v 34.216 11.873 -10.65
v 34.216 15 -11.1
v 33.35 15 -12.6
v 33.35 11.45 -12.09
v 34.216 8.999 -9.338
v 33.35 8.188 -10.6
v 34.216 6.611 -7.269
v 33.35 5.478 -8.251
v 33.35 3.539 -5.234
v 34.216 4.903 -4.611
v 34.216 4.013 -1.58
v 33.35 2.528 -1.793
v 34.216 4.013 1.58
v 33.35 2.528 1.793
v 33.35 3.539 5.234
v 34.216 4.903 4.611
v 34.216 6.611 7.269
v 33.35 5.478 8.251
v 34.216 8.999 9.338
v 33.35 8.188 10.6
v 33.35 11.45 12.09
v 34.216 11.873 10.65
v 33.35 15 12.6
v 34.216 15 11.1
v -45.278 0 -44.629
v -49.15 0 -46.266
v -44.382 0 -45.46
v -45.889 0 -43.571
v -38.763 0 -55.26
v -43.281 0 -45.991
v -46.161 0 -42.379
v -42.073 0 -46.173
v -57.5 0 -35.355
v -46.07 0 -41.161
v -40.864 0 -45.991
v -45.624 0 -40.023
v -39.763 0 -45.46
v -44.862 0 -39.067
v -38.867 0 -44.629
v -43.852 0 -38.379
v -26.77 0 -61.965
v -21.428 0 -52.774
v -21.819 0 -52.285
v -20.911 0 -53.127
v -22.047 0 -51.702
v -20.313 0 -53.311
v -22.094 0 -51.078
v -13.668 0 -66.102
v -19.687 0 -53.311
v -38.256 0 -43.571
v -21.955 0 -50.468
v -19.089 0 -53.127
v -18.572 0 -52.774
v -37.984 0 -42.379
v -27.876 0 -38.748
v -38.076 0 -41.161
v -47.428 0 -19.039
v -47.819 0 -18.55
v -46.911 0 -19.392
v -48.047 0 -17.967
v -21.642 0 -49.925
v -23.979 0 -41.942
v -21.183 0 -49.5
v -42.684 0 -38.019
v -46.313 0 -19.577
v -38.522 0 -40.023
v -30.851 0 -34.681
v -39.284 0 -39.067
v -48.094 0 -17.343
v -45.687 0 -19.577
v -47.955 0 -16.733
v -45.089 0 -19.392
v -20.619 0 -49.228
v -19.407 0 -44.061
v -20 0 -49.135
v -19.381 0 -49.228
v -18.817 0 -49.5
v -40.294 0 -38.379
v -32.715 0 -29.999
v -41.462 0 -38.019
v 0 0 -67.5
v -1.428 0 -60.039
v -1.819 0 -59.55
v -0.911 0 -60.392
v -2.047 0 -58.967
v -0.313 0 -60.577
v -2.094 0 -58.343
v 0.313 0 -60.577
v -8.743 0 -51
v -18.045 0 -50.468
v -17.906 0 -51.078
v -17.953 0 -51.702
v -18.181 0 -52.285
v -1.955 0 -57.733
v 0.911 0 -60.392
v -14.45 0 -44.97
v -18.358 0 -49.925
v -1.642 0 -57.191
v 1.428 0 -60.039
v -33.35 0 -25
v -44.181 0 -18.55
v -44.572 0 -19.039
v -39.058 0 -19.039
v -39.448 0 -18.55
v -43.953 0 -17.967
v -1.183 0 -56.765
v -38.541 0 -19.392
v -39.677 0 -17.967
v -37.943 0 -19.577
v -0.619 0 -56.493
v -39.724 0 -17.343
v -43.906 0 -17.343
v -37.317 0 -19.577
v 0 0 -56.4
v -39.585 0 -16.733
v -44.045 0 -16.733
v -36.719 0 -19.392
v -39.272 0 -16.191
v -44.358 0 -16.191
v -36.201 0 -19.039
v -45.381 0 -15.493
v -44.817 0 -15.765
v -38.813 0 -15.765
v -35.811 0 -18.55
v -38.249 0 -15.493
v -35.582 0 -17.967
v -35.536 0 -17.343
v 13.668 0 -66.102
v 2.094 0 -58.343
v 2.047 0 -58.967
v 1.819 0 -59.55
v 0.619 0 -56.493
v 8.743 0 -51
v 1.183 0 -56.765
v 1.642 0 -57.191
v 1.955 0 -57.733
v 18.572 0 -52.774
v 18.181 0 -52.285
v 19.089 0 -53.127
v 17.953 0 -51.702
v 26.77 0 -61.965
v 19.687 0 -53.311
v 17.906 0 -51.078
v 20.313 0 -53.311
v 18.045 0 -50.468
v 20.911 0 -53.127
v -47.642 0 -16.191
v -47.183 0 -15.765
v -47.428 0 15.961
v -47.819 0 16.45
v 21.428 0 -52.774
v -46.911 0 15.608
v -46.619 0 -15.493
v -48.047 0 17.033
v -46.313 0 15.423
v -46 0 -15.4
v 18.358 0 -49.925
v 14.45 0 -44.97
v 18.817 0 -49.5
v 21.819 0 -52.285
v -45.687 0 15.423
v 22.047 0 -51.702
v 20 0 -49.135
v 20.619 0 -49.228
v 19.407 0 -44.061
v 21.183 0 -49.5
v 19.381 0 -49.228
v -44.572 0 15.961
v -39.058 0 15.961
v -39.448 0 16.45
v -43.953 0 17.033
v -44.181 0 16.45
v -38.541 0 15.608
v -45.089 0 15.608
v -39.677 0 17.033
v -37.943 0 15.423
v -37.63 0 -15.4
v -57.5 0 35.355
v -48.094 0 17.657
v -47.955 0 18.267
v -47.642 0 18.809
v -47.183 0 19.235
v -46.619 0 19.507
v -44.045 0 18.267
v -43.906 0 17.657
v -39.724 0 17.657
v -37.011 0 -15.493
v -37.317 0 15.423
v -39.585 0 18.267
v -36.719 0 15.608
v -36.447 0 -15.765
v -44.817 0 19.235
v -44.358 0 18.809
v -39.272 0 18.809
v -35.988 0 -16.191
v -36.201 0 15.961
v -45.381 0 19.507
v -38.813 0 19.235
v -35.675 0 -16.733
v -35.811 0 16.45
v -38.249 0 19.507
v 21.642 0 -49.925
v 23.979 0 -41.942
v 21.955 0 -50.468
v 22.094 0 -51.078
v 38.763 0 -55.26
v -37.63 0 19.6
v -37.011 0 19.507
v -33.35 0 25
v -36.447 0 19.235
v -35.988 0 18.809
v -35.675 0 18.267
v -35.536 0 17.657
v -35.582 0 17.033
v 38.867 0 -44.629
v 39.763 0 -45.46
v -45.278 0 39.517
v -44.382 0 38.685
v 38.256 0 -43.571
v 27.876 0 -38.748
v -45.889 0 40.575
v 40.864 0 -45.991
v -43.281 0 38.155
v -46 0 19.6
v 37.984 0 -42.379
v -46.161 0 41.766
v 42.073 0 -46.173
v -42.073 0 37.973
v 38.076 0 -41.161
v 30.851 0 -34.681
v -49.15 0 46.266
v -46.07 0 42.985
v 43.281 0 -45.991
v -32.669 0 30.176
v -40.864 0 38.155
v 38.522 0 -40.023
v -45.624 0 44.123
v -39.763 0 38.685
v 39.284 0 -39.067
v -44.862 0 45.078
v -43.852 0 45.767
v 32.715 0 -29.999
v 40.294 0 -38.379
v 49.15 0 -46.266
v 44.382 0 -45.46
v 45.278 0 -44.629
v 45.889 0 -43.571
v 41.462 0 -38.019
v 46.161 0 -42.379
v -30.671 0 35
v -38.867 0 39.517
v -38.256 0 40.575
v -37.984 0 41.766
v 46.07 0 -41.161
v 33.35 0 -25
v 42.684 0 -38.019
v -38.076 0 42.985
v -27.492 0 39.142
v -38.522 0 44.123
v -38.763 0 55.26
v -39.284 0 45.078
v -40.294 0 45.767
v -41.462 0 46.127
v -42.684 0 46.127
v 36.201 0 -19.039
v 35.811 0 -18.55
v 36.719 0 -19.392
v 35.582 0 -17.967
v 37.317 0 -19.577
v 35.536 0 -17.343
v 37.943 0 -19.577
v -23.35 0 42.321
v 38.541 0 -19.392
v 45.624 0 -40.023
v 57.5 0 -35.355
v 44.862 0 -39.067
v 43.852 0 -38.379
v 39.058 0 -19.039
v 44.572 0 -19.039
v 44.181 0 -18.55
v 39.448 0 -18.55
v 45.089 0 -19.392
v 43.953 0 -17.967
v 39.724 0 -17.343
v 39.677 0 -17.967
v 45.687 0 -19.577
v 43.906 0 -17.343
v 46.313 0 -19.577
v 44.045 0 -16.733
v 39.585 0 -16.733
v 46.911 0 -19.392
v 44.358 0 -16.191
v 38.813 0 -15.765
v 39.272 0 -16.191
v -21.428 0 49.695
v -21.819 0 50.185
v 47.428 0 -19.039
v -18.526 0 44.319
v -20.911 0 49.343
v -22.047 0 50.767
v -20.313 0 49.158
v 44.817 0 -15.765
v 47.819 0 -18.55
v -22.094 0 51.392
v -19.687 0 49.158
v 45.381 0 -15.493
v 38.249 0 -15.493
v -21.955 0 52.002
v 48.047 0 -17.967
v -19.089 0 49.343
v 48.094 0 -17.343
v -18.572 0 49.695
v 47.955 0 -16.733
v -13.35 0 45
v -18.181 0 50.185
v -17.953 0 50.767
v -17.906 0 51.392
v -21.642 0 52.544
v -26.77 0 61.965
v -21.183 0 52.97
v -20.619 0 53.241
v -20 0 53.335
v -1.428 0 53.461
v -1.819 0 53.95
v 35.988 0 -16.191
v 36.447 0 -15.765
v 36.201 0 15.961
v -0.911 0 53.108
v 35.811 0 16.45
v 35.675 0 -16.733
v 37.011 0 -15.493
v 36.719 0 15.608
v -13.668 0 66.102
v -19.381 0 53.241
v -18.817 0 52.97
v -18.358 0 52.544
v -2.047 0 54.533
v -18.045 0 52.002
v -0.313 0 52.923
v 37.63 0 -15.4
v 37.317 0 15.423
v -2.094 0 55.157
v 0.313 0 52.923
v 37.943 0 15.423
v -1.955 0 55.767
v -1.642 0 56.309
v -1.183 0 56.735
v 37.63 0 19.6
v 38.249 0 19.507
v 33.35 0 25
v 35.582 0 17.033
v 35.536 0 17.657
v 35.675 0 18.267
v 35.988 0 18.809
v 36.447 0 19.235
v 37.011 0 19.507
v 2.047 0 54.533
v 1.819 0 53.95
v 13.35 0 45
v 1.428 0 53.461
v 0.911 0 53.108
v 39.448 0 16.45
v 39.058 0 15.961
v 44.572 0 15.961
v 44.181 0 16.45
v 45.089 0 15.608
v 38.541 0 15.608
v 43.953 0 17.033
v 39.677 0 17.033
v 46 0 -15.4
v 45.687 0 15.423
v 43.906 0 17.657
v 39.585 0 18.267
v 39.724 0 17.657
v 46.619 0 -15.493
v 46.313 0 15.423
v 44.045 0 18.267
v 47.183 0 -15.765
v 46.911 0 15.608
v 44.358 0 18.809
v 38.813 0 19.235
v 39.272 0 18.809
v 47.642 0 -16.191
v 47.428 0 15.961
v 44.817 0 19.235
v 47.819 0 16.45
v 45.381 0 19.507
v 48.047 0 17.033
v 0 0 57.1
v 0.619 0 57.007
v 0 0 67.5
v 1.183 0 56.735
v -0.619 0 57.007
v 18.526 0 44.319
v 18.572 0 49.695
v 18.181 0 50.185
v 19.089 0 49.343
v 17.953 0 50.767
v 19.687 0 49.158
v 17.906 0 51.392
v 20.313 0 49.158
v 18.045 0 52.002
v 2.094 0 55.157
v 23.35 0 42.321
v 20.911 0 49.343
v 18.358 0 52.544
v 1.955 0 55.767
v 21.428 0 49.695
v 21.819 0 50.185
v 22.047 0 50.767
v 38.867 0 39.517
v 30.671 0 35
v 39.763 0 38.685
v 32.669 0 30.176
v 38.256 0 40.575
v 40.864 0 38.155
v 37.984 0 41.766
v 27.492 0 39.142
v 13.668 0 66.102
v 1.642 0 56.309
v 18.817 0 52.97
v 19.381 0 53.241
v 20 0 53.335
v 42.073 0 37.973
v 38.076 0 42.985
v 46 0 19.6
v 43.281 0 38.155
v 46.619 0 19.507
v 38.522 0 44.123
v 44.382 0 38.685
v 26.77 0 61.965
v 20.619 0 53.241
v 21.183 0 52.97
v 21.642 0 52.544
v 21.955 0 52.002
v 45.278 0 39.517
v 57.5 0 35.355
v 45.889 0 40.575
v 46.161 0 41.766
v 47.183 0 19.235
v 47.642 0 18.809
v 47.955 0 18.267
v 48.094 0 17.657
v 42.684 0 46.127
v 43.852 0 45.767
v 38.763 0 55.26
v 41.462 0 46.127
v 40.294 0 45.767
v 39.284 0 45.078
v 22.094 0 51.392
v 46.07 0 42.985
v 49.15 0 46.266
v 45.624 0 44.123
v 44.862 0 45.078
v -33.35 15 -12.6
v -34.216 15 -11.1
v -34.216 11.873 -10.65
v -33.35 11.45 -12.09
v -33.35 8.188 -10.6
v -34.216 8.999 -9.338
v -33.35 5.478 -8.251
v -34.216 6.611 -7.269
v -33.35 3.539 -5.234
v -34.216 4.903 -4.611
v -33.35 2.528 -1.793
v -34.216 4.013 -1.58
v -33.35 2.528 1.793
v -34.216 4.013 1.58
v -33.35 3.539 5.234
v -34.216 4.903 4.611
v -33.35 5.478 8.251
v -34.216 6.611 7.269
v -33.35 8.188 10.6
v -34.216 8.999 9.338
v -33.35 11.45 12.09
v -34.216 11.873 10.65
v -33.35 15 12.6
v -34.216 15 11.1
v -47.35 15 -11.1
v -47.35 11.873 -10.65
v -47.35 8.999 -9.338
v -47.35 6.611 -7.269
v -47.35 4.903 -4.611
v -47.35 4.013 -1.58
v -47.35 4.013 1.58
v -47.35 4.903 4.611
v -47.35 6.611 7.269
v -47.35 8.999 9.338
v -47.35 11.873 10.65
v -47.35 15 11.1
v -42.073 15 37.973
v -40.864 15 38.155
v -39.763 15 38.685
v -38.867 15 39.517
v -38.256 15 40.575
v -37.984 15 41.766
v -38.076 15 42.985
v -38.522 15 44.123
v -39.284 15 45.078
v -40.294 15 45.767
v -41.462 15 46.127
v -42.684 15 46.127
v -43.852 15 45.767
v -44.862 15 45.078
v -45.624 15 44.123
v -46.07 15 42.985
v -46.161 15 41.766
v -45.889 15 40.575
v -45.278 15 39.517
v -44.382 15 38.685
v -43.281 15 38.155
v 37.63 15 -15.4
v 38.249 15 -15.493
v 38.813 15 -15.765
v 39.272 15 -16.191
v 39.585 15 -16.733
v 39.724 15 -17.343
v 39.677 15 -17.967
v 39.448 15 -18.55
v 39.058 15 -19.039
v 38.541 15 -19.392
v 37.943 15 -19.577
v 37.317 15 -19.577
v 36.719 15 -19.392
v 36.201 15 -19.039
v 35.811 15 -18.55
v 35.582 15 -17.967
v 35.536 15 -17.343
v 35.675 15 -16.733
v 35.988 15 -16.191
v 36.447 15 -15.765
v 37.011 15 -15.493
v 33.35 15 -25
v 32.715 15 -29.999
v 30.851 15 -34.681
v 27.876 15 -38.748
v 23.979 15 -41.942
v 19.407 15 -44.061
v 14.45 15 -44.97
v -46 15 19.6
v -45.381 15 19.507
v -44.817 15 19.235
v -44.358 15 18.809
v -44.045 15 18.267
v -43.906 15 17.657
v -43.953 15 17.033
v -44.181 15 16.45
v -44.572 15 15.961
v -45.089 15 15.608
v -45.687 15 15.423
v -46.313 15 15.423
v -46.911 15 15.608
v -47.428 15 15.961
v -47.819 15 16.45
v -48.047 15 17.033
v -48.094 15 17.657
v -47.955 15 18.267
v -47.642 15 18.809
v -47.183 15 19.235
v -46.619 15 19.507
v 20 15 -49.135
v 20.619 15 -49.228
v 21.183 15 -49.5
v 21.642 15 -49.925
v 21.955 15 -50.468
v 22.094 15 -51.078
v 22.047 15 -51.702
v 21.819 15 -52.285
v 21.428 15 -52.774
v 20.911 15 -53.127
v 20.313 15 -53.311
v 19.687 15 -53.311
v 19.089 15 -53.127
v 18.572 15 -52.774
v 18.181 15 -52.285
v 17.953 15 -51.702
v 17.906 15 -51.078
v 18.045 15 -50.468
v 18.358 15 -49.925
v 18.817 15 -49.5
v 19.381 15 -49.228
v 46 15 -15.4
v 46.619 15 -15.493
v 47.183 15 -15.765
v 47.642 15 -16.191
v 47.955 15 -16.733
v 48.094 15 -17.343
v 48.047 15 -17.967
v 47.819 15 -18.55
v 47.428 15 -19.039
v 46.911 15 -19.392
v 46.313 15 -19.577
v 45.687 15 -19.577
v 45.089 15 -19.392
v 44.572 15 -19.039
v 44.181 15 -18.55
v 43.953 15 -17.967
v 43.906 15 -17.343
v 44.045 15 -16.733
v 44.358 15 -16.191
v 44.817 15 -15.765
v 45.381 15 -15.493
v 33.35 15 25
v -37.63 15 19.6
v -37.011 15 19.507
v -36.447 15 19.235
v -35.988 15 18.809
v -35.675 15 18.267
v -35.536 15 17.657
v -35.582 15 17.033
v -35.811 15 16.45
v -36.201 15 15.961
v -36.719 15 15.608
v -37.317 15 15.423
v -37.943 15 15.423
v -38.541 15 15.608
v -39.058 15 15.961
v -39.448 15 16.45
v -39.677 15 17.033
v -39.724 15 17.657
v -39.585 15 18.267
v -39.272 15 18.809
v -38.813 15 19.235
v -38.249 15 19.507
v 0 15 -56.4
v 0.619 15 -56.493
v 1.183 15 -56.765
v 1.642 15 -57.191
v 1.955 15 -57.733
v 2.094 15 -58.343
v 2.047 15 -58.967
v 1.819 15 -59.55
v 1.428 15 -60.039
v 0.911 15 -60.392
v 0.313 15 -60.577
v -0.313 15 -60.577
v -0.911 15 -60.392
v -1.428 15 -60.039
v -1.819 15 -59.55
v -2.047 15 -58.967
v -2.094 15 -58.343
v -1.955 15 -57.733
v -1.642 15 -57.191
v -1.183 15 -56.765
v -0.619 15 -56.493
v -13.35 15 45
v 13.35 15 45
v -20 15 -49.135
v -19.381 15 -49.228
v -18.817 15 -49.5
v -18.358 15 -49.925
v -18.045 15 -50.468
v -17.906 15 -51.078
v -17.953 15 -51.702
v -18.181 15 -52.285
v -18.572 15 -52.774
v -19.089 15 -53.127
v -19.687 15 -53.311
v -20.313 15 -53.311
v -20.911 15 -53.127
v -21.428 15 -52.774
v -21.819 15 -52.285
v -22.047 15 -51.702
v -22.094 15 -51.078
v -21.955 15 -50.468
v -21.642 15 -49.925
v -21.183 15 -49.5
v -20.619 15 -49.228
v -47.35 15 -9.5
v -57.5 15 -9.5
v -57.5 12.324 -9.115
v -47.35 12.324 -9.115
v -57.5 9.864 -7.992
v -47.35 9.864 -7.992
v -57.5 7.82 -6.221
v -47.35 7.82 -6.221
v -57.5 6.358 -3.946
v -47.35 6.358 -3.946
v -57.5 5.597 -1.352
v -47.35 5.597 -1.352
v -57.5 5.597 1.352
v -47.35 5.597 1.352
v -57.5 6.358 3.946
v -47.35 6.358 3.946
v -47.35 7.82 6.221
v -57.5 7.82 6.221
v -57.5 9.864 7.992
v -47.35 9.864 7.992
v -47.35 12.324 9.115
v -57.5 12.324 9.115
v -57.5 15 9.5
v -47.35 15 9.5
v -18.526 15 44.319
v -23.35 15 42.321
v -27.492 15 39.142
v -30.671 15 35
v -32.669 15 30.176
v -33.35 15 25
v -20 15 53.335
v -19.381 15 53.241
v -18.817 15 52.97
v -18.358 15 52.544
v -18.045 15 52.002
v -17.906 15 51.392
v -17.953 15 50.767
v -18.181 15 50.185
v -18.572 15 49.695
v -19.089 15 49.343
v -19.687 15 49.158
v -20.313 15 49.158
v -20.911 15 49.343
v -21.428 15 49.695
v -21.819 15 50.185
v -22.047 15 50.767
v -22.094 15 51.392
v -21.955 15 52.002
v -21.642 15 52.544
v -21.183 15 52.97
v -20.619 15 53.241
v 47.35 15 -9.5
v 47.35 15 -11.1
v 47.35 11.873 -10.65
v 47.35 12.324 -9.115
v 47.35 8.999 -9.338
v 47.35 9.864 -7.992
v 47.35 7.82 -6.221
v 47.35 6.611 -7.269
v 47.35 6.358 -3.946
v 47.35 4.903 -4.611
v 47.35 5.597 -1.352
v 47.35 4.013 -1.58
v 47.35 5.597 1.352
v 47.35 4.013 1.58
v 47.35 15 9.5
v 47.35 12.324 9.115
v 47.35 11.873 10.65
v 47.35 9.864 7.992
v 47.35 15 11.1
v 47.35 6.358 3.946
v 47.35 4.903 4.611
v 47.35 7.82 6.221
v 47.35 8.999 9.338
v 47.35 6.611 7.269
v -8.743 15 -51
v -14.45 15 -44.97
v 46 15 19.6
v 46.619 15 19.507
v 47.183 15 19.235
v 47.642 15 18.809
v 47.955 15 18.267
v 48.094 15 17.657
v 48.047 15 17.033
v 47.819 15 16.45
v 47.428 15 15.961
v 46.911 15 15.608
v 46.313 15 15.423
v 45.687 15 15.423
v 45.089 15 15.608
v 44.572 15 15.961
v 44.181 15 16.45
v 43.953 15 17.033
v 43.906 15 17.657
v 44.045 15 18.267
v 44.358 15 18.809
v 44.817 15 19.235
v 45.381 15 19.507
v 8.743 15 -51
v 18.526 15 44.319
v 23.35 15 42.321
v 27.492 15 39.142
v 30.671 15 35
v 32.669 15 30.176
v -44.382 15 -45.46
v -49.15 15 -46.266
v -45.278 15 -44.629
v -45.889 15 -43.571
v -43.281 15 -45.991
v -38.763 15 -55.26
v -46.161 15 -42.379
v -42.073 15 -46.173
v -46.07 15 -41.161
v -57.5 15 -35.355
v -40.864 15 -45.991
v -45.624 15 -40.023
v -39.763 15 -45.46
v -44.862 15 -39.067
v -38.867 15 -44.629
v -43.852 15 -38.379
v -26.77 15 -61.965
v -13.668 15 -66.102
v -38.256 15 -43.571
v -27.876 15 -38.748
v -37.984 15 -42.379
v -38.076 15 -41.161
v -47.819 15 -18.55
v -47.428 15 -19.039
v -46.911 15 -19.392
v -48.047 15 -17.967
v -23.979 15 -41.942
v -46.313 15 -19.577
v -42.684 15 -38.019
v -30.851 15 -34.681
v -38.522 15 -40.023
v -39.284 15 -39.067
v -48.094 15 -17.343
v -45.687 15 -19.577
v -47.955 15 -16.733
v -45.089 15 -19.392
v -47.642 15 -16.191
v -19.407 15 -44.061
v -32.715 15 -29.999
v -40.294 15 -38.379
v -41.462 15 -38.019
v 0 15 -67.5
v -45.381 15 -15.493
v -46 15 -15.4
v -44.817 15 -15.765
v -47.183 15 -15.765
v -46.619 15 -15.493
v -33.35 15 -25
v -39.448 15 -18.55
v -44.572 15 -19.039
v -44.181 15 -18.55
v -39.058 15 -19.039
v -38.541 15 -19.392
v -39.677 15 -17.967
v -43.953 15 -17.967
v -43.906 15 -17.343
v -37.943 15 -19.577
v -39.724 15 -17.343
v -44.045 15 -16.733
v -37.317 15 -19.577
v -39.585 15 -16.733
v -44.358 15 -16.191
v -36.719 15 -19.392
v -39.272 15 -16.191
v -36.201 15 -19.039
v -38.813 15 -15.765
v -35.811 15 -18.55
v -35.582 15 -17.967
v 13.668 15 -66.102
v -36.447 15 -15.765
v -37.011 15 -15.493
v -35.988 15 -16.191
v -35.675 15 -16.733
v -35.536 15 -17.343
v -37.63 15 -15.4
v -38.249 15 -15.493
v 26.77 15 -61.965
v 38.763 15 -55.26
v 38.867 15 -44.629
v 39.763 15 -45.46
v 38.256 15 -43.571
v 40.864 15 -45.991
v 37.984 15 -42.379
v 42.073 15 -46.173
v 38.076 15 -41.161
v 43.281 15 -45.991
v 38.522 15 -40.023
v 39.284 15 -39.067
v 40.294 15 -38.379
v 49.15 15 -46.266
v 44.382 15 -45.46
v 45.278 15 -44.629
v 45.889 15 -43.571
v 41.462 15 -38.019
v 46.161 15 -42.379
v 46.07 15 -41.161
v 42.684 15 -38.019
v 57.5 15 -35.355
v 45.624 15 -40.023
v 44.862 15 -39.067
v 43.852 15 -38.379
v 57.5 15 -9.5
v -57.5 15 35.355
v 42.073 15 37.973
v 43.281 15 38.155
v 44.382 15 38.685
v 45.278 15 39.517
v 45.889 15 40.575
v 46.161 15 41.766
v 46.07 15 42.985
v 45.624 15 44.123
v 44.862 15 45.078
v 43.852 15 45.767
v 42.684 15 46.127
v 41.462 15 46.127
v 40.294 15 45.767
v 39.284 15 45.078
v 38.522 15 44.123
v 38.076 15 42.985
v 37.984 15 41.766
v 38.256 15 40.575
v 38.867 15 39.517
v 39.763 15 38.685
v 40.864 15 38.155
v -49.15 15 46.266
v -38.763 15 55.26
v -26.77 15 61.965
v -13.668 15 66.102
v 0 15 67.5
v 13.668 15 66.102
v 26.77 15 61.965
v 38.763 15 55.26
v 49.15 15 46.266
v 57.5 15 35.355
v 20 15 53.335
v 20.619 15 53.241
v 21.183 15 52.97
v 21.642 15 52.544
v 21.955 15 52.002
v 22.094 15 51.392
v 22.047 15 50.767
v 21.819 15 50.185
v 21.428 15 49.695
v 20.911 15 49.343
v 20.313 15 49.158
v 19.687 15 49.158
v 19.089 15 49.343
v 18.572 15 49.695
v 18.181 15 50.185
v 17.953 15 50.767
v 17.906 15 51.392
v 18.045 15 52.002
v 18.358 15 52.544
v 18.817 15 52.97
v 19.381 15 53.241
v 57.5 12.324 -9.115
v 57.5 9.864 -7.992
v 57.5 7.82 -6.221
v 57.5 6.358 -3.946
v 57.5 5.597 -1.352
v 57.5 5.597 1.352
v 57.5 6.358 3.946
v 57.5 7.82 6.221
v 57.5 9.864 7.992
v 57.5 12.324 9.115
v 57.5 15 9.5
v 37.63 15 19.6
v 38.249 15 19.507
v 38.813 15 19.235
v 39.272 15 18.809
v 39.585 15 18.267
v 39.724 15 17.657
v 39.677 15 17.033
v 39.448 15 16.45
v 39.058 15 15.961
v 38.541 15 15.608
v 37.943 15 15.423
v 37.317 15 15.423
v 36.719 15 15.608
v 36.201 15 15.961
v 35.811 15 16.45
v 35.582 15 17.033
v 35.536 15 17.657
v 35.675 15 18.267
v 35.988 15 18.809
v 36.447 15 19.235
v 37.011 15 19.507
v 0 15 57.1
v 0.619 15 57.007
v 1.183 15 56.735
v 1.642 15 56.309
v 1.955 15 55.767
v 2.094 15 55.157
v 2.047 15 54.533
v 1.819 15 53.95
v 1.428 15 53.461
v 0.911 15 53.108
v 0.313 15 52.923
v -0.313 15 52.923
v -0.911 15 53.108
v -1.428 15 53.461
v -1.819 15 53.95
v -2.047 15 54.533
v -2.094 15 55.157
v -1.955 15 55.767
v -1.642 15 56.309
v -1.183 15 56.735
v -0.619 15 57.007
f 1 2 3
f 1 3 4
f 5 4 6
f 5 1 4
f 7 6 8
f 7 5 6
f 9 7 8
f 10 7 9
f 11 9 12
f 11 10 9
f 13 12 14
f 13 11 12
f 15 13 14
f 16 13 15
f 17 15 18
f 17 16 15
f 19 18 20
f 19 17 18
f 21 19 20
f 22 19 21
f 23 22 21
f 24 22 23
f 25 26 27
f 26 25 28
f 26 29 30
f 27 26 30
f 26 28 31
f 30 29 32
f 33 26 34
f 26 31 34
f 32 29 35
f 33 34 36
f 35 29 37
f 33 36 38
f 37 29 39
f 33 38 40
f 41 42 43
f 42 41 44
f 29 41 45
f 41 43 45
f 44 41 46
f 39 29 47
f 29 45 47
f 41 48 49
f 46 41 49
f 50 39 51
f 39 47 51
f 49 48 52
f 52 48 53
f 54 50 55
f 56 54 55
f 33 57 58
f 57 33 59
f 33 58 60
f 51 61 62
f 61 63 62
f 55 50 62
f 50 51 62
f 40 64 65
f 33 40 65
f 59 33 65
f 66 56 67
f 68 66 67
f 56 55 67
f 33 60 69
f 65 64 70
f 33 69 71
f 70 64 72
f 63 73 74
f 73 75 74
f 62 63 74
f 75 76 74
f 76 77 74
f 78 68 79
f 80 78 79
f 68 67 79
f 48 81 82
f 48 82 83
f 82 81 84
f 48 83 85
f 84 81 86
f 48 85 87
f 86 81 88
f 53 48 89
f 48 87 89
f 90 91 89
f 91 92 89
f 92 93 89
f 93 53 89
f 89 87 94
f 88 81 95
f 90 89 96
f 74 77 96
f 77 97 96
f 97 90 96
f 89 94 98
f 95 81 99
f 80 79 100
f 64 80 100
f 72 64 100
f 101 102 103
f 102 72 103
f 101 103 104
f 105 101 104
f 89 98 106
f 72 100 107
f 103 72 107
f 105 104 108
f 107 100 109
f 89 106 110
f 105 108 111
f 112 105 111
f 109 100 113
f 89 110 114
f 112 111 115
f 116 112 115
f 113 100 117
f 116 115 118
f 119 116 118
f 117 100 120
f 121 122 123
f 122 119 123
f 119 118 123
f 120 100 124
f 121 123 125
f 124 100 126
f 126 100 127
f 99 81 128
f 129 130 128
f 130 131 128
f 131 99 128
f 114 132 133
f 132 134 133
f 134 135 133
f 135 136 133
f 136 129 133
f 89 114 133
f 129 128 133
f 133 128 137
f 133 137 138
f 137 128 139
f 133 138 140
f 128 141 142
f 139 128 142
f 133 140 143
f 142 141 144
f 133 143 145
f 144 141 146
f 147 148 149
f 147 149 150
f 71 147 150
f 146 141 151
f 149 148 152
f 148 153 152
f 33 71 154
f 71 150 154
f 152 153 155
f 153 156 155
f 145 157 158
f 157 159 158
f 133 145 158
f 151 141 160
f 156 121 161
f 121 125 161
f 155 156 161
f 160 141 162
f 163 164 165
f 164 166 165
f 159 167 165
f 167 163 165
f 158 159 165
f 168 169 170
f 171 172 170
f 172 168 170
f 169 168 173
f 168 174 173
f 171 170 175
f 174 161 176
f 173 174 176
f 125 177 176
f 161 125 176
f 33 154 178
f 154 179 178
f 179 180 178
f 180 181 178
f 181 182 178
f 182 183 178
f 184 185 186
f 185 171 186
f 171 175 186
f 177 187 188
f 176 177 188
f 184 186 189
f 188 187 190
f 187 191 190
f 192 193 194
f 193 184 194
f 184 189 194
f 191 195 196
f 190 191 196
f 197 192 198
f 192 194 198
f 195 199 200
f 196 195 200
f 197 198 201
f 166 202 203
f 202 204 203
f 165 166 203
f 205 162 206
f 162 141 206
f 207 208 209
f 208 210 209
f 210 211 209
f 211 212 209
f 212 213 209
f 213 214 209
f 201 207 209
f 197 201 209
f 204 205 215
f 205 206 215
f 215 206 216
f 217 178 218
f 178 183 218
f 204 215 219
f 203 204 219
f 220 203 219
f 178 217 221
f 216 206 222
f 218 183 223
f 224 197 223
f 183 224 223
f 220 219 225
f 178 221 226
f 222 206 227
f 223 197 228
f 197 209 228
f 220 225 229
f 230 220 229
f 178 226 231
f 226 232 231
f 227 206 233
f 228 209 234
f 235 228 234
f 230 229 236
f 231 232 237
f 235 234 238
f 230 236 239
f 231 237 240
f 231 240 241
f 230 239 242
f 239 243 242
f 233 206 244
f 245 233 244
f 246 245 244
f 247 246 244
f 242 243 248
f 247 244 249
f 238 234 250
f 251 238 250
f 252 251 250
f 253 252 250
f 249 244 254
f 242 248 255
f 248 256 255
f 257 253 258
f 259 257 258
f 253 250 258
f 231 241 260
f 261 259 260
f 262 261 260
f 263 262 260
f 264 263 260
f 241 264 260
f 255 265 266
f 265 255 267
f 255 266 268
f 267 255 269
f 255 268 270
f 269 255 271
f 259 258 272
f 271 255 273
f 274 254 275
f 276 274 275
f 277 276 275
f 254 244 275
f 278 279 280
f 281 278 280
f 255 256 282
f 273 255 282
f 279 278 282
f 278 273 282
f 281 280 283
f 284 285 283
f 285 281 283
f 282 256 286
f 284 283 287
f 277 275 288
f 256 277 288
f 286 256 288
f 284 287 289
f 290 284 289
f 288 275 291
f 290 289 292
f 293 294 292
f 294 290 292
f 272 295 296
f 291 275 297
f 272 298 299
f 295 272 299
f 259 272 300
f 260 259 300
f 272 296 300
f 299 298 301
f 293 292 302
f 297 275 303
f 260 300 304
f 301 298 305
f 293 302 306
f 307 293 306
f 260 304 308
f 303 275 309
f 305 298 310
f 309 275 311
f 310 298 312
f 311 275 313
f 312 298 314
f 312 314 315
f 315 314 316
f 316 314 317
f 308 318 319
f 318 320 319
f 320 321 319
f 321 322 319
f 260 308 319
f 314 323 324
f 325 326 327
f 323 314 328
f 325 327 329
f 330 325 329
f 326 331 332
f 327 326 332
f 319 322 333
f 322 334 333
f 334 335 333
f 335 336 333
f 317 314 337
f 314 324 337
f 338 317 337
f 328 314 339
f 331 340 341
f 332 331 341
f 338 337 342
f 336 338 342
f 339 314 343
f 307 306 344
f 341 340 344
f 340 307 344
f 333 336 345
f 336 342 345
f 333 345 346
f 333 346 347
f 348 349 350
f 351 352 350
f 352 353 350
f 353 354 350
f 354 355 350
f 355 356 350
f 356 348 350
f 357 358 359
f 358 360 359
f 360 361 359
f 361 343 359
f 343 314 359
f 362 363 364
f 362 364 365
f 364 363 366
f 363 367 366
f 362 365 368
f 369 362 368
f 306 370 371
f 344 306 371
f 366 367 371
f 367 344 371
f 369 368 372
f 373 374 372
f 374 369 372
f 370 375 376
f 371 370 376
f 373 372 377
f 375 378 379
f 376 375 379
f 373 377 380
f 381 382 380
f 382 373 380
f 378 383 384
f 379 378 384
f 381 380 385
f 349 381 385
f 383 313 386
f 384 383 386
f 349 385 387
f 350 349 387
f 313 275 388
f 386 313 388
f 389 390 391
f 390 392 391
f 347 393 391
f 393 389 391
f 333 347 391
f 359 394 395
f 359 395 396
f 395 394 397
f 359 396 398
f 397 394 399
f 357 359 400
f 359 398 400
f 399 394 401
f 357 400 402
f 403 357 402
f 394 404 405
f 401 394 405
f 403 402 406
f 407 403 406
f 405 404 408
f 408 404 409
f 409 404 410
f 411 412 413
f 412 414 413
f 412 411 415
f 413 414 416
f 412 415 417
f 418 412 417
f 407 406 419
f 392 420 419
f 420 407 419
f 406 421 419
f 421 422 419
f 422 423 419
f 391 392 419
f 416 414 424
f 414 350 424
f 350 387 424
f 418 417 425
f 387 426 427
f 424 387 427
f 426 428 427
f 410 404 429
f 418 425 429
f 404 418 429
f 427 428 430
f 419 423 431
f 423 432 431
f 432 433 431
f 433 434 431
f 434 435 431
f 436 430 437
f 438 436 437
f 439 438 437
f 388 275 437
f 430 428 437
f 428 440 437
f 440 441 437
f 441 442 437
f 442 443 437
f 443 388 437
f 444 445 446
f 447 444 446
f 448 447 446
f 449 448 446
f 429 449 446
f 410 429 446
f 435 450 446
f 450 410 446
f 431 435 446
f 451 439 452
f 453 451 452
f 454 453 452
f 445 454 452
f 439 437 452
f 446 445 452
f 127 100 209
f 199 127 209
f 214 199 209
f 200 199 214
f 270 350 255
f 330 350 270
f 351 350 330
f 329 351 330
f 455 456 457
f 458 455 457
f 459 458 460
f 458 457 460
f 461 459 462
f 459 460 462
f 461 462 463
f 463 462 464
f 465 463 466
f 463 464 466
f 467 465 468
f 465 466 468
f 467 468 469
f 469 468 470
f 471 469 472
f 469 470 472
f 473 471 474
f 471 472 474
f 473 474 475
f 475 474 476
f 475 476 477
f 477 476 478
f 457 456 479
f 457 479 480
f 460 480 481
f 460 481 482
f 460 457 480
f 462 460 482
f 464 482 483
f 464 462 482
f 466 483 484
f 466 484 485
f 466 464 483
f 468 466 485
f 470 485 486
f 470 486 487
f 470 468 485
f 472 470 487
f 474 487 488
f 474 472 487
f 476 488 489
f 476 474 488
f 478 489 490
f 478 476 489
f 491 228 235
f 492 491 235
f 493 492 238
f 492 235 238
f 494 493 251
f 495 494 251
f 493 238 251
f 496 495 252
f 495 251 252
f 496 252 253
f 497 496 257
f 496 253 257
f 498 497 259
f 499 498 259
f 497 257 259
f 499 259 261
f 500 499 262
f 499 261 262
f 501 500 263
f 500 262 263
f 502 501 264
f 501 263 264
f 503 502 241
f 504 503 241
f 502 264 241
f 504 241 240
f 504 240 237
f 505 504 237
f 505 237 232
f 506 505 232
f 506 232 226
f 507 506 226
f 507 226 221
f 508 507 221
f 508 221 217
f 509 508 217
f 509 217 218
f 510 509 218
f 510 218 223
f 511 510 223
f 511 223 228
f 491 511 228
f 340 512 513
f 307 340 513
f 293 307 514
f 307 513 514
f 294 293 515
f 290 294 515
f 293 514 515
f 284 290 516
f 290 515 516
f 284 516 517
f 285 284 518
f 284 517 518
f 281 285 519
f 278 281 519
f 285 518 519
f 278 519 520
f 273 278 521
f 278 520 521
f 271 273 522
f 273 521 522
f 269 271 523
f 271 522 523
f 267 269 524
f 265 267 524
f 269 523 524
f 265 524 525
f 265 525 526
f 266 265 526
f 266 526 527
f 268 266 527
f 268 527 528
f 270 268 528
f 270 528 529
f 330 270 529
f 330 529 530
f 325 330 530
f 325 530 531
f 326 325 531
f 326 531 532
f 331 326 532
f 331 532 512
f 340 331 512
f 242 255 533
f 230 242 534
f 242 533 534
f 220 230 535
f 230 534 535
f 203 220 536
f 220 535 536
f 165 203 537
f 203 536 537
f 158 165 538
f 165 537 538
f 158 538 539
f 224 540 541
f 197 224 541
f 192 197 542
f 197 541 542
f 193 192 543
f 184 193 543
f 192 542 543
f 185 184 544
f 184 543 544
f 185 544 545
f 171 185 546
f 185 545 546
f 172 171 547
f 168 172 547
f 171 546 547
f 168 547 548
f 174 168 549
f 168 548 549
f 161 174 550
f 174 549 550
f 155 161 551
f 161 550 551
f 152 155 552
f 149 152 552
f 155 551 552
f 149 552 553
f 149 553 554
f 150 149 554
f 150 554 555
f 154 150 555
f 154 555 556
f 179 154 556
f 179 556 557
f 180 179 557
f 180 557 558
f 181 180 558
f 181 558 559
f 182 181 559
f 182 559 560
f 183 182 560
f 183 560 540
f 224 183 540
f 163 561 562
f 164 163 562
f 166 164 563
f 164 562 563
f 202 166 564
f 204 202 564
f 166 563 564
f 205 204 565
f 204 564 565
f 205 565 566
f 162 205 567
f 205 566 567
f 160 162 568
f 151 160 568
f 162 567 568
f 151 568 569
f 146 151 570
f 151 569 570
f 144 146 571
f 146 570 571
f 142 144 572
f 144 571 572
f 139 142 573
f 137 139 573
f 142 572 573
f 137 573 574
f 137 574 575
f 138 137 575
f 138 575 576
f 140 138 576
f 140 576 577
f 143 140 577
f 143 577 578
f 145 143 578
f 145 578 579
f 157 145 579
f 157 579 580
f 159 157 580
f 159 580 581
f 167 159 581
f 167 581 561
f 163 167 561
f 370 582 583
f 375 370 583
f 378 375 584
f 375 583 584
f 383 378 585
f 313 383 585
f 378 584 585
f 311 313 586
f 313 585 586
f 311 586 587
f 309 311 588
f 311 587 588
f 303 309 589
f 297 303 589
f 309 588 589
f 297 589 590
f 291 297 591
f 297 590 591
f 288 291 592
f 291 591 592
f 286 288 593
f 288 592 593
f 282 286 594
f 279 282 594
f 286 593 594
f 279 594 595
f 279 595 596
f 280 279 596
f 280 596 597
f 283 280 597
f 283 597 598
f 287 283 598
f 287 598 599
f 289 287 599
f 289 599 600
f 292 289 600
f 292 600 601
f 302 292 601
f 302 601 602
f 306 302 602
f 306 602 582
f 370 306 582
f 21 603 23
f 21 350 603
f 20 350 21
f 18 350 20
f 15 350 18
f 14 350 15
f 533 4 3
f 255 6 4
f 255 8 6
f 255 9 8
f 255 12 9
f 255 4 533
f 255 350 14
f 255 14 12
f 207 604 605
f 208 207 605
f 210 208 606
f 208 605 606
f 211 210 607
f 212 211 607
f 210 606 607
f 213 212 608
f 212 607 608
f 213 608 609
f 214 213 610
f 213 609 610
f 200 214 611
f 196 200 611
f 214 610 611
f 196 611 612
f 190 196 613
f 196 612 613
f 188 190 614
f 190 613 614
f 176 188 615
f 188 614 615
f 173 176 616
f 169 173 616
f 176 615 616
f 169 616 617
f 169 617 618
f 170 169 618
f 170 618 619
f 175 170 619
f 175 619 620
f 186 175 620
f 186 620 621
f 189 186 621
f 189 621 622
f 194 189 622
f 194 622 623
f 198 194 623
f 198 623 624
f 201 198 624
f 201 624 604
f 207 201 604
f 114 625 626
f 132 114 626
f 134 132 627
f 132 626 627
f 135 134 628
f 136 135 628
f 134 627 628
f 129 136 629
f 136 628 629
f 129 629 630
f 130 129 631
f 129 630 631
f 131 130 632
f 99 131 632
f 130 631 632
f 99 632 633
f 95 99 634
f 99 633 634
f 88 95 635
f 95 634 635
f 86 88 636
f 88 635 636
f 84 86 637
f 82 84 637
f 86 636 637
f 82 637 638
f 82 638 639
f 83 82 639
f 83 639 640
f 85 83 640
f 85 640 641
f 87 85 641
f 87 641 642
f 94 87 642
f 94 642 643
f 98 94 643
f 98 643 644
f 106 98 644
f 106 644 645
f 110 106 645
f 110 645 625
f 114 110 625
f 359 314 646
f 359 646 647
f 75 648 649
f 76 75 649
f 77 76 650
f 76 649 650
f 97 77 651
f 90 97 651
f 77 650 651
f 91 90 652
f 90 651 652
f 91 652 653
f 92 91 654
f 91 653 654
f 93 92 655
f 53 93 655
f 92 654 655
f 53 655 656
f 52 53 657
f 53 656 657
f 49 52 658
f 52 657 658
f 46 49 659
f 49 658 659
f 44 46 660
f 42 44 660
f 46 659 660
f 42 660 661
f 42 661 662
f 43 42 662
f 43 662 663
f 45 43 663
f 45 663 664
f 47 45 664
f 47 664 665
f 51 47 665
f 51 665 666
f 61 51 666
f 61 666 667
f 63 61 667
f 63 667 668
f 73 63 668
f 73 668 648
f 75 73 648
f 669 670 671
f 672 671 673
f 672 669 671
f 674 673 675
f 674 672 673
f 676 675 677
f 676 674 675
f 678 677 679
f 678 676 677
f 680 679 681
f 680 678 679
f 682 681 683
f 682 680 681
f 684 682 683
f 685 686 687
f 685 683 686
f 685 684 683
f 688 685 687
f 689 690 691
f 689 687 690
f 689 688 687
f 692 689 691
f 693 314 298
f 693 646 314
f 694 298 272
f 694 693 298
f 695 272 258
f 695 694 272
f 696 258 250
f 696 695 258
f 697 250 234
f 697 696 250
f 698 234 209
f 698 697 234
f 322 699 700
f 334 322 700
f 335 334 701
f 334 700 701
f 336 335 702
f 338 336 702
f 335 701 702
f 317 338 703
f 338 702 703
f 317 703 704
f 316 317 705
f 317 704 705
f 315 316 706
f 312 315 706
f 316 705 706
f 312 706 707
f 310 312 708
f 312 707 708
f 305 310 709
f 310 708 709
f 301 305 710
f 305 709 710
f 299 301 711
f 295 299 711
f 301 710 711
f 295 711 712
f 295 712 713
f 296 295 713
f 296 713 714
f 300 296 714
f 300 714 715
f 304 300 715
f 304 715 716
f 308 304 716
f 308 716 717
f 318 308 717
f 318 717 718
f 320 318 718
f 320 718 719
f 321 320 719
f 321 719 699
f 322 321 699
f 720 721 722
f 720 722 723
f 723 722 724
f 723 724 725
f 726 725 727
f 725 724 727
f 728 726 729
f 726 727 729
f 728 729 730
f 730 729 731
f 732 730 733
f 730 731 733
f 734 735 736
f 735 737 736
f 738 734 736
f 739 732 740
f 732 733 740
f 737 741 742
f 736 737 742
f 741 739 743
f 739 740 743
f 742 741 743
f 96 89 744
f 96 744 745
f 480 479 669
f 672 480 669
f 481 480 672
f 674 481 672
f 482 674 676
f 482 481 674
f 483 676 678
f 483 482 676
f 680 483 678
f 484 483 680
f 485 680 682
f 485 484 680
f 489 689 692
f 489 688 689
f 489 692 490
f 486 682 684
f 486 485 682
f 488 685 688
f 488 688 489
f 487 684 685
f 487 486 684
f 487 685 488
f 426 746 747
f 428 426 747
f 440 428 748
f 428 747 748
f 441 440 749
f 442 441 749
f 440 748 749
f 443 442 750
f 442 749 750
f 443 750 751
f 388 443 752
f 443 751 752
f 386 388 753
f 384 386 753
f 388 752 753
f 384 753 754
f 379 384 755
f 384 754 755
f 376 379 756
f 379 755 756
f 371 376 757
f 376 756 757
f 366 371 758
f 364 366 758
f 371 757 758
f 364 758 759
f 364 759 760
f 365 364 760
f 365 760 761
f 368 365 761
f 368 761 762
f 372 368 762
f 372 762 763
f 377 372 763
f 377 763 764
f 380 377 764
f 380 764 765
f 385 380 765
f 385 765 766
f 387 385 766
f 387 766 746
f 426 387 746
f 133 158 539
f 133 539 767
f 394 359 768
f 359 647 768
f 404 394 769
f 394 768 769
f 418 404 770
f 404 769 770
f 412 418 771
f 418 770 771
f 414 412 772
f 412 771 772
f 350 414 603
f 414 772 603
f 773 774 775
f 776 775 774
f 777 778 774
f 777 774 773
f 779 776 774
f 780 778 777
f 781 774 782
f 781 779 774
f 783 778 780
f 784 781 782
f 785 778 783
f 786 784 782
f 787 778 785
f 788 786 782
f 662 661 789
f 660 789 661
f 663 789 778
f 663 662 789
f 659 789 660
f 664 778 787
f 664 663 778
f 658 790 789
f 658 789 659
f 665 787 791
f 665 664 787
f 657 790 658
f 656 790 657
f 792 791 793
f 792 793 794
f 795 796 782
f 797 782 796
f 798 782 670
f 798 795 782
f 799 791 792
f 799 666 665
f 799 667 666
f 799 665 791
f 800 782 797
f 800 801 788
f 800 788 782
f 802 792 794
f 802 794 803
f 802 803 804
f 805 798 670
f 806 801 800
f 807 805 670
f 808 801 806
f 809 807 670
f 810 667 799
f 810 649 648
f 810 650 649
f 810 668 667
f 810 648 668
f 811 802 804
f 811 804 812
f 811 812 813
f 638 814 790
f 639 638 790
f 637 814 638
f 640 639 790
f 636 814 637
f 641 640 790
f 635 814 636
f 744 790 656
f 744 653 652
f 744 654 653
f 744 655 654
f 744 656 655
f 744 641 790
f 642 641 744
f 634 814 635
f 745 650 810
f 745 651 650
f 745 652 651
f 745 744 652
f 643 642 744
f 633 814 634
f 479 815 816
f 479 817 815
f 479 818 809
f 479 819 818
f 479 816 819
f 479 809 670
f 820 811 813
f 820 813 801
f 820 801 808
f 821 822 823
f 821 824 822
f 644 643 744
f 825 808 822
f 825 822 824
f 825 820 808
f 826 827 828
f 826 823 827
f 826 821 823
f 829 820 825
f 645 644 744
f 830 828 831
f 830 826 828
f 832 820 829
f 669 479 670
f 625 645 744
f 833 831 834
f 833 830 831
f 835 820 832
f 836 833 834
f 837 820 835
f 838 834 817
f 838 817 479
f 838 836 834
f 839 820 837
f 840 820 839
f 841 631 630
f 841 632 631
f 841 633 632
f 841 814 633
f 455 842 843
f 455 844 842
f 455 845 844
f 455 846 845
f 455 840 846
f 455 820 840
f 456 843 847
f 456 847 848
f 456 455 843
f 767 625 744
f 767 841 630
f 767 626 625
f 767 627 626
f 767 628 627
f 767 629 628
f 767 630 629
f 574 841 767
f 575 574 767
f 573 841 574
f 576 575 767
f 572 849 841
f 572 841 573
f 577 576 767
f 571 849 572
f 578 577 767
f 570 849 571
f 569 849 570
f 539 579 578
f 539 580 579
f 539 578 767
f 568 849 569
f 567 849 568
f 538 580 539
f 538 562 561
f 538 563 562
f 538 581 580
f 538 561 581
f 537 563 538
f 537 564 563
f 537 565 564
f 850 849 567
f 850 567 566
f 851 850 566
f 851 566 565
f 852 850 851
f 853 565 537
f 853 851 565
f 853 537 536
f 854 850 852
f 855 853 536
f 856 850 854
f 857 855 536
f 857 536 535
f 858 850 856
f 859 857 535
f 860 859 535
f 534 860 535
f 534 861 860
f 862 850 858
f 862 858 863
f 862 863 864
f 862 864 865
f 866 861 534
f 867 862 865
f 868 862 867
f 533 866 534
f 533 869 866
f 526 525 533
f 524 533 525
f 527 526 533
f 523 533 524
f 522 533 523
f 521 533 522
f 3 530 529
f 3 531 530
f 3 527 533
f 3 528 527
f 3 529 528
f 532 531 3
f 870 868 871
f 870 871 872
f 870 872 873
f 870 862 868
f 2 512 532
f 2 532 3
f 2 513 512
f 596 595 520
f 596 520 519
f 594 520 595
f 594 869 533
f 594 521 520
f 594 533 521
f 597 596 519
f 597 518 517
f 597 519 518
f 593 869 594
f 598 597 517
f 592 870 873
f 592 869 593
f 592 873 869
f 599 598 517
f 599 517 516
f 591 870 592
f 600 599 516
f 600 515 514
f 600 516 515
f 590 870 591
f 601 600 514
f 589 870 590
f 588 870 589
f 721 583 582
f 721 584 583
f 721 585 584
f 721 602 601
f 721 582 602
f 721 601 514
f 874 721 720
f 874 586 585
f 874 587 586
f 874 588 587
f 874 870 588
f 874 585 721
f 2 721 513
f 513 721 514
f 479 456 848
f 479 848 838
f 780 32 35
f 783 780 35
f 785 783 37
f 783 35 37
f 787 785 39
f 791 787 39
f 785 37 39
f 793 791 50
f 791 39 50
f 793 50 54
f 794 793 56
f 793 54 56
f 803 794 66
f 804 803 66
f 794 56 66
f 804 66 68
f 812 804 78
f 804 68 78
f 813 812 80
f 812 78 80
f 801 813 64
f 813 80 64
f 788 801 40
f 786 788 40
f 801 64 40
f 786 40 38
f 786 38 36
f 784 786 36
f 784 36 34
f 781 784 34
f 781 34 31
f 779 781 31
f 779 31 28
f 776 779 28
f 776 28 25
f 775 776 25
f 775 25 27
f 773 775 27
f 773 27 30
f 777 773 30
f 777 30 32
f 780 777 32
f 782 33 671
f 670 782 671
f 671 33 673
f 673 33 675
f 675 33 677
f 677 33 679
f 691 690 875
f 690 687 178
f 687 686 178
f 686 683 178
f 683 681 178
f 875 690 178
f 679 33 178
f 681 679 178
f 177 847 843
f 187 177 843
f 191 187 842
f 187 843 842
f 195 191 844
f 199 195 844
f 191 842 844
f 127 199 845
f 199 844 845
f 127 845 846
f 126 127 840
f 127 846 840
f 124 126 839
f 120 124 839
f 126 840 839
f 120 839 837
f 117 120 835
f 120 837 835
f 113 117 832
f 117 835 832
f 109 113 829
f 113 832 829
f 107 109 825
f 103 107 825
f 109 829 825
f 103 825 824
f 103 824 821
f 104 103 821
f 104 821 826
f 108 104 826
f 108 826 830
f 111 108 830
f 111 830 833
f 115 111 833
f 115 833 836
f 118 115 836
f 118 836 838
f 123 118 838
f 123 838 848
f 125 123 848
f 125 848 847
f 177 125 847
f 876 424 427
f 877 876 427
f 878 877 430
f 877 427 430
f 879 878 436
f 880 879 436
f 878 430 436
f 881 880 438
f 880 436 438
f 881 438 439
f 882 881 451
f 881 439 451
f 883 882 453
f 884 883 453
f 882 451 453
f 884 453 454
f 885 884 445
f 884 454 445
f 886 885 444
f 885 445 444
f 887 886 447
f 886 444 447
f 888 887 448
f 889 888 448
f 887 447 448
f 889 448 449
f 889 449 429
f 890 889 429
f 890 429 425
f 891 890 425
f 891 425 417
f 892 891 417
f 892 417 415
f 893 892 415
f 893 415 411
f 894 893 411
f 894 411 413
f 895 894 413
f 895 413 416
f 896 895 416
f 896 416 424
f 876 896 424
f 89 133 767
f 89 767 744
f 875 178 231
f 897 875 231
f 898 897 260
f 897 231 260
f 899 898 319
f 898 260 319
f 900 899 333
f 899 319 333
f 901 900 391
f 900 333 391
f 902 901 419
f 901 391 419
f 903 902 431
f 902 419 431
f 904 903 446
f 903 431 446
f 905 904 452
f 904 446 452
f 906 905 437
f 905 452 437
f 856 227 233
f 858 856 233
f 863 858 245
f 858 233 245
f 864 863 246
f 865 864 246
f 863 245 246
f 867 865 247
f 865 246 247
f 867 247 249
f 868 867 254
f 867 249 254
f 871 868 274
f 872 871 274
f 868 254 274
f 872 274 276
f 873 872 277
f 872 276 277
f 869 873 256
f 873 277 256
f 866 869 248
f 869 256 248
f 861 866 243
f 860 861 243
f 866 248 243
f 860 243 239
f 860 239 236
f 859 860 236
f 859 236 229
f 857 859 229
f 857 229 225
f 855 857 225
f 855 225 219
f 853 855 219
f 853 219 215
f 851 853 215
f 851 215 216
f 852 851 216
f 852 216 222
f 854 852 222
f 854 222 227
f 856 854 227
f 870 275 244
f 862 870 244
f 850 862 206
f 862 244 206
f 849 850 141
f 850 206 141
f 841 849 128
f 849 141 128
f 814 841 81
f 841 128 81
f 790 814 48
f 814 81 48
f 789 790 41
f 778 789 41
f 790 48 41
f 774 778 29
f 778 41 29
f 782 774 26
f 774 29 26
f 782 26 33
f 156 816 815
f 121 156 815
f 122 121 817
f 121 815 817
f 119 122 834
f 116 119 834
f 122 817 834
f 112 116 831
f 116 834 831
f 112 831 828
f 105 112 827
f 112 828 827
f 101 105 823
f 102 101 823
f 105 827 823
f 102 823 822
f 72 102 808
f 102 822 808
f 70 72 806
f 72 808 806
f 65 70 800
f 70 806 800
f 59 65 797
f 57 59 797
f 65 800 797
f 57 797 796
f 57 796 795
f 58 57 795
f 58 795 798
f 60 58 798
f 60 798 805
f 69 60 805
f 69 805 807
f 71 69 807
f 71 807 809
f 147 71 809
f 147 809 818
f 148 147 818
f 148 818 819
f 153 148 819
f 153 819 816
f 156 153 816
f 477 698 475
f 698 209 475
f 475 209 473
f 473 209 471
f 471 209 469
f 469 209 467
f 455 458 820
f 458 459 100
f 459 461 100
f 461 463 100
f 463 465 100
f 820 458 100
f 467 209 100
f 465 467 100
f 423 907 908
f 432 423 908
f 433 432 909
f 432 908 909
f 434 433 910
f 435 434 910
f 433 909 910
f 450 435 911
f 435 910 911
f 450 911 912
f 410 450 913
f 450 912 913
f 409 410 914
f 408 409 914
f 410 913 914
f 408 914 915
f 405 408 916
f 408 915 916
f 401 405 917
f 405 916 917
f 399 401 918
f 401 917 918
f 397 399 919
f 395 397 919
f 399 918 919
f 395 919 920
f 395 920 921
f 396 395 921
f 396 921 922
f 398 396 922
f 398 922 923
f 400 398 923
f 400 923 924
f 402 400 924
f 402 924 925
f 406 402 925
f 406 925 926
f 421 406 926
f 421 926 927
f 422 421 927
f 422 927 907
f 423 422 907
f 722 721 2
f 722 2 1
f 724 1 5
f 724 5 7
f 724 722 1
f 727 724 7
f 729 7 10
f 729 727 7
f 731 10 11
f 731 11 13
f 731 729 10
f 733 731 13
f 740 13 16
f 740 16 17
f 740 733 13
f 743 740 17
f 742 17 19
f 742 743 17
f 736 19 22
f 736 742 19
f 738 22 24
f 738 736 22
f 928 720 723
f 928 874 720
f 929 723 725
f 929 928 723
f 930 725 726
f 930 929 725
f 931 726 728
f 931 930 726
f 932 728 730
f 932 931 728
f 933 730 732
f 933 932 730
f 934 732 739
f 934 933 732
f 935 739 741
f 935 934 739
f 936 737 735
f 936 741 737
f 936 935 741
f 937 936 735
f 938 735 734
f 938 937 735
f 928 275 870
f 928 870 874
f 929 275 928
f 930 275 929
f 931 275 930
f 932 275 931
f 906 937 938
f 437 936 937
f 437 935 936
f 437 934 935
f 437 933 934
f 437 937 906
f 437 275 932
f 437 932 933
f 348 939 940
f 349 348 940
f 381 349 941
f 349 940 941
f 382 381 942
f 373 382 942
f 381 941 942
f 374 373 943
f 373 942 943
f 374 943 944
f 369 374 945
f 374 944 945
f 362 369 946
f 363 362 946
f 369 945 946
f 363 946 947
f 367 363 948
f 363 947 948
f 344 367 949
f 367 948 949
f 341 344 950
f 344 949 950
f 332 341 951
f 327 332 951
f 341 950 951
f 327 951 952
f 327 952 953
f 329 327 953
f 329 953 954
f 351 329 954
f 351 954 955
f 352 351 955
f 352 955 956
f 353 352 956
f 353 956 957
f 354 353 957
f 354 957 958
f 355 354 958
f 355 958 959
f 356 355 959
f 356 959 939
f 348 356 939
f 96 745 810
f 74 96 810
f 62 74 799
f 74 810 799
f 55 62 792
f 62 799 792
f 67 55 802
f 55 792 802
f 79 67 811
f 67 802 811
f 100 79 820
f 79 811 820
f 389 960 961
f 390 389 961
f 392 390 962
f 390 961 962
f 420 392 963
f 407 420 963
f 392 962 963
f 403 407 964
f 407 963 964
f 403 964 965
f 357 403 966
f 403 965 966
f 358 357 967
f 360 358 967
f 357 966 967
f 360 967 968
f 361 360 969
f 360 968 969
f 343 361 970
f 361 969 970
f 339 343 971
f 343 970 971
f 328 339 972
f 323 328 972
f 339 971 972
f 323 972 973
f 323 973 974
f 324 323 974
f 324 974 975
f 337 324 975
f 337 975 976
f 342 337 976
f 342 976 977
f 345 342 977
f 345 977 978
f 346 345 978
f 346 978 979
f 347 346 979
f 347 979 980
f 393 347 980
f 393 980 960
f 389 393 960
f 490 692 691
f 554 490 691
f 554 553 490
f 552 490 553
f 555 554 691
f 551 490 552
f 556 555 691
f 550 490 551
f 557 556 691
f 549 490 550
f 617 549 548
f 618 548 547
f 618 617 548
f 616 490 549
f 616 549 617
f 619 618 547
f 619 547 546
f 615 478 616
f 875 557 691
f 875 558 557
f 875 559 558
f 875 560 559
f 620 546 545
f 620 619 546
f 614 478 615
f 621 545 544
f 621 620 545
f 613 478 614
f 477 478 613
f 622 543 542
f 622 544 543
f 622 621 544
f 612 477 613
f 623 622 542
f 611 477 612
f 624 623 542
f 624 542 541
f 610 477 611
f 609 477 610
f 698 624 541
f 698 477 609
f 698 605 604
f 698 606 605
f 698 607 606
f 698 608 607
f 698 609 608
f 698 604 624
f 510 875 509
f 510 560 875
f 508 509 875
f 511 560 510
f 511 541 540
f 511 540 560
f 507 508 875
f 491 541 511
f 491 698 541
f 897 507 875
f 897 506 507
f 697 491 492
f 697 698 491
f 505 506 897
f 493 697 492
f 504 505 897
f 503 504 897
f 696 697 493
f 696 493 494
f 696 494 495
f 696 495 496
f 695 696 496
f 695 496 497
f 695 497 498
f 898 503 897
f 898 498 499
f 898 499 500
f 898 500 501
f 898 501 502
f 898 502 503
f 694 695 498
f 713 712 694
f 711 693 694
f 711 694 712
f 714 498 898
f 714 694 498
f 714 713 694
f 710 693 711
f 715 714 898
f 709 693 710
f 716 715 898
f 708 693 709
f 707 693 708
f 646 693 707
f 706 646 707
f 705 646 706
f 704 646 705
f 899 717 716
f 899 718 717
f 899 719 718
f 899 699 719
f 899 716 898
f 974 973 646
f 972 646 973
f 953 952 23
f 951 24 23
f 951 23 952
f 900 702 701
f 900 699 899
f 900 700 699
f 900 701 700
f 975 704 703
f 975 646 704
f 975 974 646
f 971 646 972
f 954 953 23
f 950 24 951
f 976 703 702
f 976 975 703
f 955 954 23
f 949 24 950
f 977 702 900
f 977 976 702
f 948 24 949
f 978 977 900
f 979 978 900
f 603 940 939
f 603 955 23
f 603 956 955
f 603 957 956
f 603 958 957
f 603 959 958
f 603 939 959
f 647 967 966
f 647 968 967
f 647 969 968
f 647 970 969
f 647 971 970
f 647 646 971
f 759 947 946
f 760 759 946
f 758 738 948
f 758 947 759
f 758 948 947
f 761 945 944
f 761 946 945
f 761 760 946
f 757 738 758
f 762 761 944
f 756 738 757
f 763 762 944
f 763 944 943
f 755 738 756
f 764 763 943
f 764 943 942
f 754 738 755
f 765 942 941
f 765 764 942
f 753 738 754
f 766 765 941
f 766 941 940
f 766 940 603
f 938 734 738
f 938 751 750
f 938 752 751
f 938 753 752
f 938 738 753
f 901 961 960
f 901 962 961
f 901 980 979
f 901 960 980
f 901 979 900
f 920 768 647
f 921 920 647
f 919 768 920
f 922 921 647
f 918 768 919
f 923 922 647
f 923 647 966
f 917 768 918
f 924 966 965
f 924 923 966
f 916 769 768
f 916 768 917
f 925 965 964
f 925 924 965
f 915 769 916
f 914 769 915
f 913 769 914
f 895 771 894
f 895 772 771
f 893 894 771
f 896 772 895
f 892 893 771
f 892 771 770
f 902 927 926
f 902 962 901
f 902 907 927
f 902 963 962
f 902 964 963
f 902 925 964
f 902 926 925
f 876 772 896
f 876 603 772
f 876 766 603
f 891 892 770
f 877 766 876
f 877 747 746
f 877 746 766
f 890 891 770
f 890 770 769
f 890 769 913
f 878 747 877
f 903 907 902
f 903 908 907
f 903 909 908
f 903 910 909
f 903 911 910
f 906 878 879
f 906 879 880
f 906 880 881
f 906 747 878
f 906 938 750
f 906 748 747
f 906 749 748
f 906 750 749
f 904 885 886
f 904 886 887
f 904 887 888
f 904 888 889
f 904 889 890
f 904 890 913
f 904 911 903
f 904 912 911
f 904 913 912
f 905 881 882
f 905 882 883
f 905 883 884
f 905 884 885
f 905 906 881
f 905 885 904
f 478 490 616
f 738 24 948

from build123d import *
from OCP.BRepFilletAPI import BRepFilletAPI_MakeChamfer

# Parameters (mm, degrees)
SKETCH2_R               = 67.5
SKETCH2_W               = 66.7
SKETCH2_H               = 90
BOSS_EXTRUDE1_DEPTH     = 15
SKETCH7_W               = 14
SKETCH7_H               = 11.1
CUT_EXTRUDE1_DEPTH      = 135.058839694
CUT_EXTRUDE1_DEPTH_BACK = 135.058839694
SKETCH8_R               = 9.5
FILLET1_R               = 20
SKETCH9_R               = 2.1
CUT_EXTRUDE2_DEPTH      = 97.630740606
CHAMFER1_SIZE           = 1.5
CHAMFER1_SIZE2          = 0.866025404
SKETCH10_R              = 4.1
CUT_EXTRUDE3_DEPTH      = 97.630740606
CUT_EXTRUDE4_DEPTH      = 97.630740606
SKETCH12_W              = 10
SKETCH12_H              = 6
CUT_EXTRUDE5_DEPTH      = 97.630740606
CHAMFER2_START          = -1
CHAMFER2_DEPTH          = 16
CUT_EXTRUDE6_DEPTH      = 97.630740606


with BuildPart() as part:
    # Sketch2 → Boss-Extrude1 (new body)
    with BuildSketch(Plane(origin=(0, 0, 0), x_dir=(1, 0, 0), z_dir=(0, 1, 0))):
        with Locations(Location((0, 0, 0), (0, 0, 270))):
            Circle(SKETCH2_R)
        Rectangle(SKETCH2_W, SKETCH2_H, mode=Mode.SUBTRACT)
    extrude(amount=BOSS_EXTRUDE1_DEPTH)

    # Sketch7 → Cut-Revolve2 (revolve, cut)
    with BuildSketch(Plane(origin=(0, 15, 0), x_dir=(1, 0, 0), z_dir=(0, 1, 0))):
        with Locations((-40.35, 5.55)):
            Rectangle(SKETCH7_W, SKETCH7_H)
        with Locations((40.35, 5.55)):
            Rectangle(SKETCH7_W, SKETCH7_H)
    revolve(axis=Axis((67.5, 15, 0), (-1, 0, 0)), mode=Mode.SUBTRACT)

    # Sketch8 → Cut-Extrude1 (cut, two sides: drawn at the far end of the back side and taken through both)
    with BuildSketch(Plane.ZY.offset(-47.35).offset(-CUT_EXTRUDE1_DEPTH_BACK)):
        with Locations((0, 15)):
            Circle(SKETCH8_R)
    extrude(amount=CUT_EXTRUDE1_DEPTH + CUT_EXTRUDE1_DEPTH_BACK, mode=Mode.SUBTRACT)

    # Fillet1
    fillet1_edges = [part.edges().sort_by_distance(p)[0] for p in [
        (-33.35, 7.5, -45),
        (-33.35, 7.5, 45),
        (33.35, 7.5, 45),
        (33.35, 7.5, -45),
    ]]
    fillet(fillet1_edges, radius=FILLET1_R)

    # Sketch9 → Cut-Extrude2 (cut, through all)
    with BuildSketch(Plane(origin=(0, 15, 0), x_dir=(1, 0, 0), z_dir=(0, 1, 0))):
        with Locations(Location((-37.629775444, 17.5, 0), (0, 0, 270))):
            Circle(SKETCH9_R)
        with Locations(Location((37.629775444, 17.5, 0), (0, 0, 270))):
            Circle(SKETCH9_R)
        with Locations(Location((37.629775444, -17.5, 0), (0, 0, 270))):
            Circle(SKETCH9_R)
        with Locations(Location((-37.629775444, -17.5, 0), (0, 0, 270))):
            Circle(SKETCH9_R)
        with Locations(Location((-20, 51.23475383, 0), (0, 0, 270))):
            Circle(SKETCH9_R)
        with Locations(Location((20, 51.23475383, 0), (0, 0, 270))):
            Circle(SKETCH9_R)
        with Locations(Location((20, -51.23475383, 0), (0, 0, 270))):
            Circle(SKETCH9_R)
        with Locations(Location((-20, -51.23475383, 0), (0, 0, 270))):
            Circle(SKETCH9_R)
        with Locations(Location((0, -55, 0), (0, 0, 270))):
            Circle(SKETCH9_R)
        with Locations(Location((0, 58.5, 0), (0, 0, 270))):
            Circle(SKETCH9_R)
        with Locations(Location((-46, 17.5, 0), (0, 0, 270))):
            Circle(SKETCH9_R)
        with Locations(Location((46, 17.5, 0), (0, 0, 270))):
            Circle(SKETCH9_R)
        with Locations(Location((46, -17.5, 0), (0, 0, 270))):
            Circle(SKETCH9_R)
        with Locations(Location((-46, -17.5, 0), (0, 0, 270))):
            Circle(SKETCH9_R)
    extrude(amount=-CUT_EXTRUDE2_DEPTH, mode=Mode.SUBTRACT)

    # Chamfer1: one chamfer whose edges measure the first distance from different faces: ONE call of the kernel's chamfer builder (chamfer() names one face for all edges)
    chamfer1_edges_1 = [part.edges().sort_by_distance(p)[0] for p in [
        (-33.35, 3.9, 0),
    ]]
    chamfer1_side_1 = [part.faces().sort_by_distance(p)[0] for p in [
        (-33.35, 0.522015325, 0),
    ]]
    chamfer1_edges_2 = [part.edges().sort_by_distance(p)[0] for p in [
        (33.35, 3.9, 0),
    ]]
    chamfer1_side_2 = [part.faces().sort_by_distance(p)[0] for p in [
        (33.35, 0.522015325, 0),
    ]]
    chamfer1 = BRepFilletAPI_MakeChamfer(part.part.solid().wrapped)
    for e in chamfer1_edges_1:
        chamfer1.Add(CHAMFER1_SIZE, CHAMFER1_SIZE2, e.wrapped, chamfer1_side_1[0].wrapped)  # the first distance lies on this face
    for e in chamfer1_edges_2:
        chamfer1.Add(CHAMFER1_SIZE, CHAMFER1_SIZE2, e.wrapped, chamfer1_side_2[0].wrapped)  # the first distance lies on this face
    add(Compound.cast(chamfer1.Shape()), mode=Mode.REPLACE)

    # Sketch10 → Cut-Extrude3 (cut, through all)
    with BuildSketch(Plane.XZ):
        with Locations(Location((42.072853481, -42.072853481, 0), (0, 0, 270))):
            Circle(SKETCH10_R)
        with Locations(Location((-42.072853481, -42.072853481, 0), (0, 0, 270))):
            Circle(SKETCH10_R)
        with Locations(Location((-42.072853481, 42.072853481, 0), (0, 0, 270))):
            Circle(SKETCH10_R)
        with Locations(Location((42.072853481, 42.072853481, 0), (0, 0, 270))):
            Circle(SKETCH10_R)
    extrude(amount=-CUT_EXTRUDE3_DEPTH, mode=Mode.SUBTRACT)

    # Sketch11 → Cut-Extrude4 (cut, through all)
    with BuildSketch(Plane.XZ):
        with BuildLine():
            Line((57.5, -35.355339059), (57.5, 35.355339059))
            ThreePointArc((57.5, 35.355339059), (67.5, 0), (57.5, -35.355339059))
        make_face()
    extrude(amount=-CUT_EXTRUDE4_DEPTH, mode=Mode.SUBTRACT)

    # Sketch12 → Cut-Extrude5 (cut, through all)
    with BuildSketch(Plane(origin=(0, 15, 0), x_dir=(1, 0, 0), z_dir=(0, 1, 0))):
        with Locations((0, 48)):
            Rectangle(SKETCH12_W, SKETCH12_H)
    extrude(amount=-CUT_EXTRUDE5_DEPTH, mode=Mode.SUBTRACT)

    # Chamfer2: read off the stored shape, not the designer's step
    # Chamfer2 outline → Chamfer2 (cut)
    with BuildSketch(Plane(origin=(0, 0, 0), x_dir=(1, 0, 0), z_dir=(0, 1, 0)).offset(CHAMFER2_START)):
        with BuildLine():
            Line((14.45, 44.969727089), (8.74275335, 51))
            Line((8.74275335, 51), (5, 51))
            Line((5, 51), (5, 45))
            Line((5, 45), (13.35, 45))
            ThreePointArc((13.35, 45), (13.900208244, 44.99243034), (14.45, 44.969727089))
        make_face()
        with BuildLine():
            Line((-5, 45), (-5, 51))
            Line((-5, 51), (-8.74275335, 51))
            Line((-8.74275335, 51), (-14.45, 44.969727089))
            ThreePointArc((-14.45, 44.969727089), (-13.900208244, 44.99243034), (-13.35, 45))
            Line((-13.35, 45), (-5, 45))
        make_face()
    extrude(amount=CHAMFER2_DEPTH, mode=Mode.SUBTRACT)

    # Sketch13 → Cut-Extrude6 (cut, through all)
    with BuildSketch(Plane.XZ):
        with BuildLine():
            Line((-57.5, -35.355339059), (-57.5, 35.355339059))
            ThreePointArc((-57.5, 35.355339059), (-67.5, 0), (-57.5, -35.355339059))
        make_face()
    extrude(amount=-CUT_EXTRUDE6_DEPTH, mode=Mode.SUBTRACT)


solid = part.part
